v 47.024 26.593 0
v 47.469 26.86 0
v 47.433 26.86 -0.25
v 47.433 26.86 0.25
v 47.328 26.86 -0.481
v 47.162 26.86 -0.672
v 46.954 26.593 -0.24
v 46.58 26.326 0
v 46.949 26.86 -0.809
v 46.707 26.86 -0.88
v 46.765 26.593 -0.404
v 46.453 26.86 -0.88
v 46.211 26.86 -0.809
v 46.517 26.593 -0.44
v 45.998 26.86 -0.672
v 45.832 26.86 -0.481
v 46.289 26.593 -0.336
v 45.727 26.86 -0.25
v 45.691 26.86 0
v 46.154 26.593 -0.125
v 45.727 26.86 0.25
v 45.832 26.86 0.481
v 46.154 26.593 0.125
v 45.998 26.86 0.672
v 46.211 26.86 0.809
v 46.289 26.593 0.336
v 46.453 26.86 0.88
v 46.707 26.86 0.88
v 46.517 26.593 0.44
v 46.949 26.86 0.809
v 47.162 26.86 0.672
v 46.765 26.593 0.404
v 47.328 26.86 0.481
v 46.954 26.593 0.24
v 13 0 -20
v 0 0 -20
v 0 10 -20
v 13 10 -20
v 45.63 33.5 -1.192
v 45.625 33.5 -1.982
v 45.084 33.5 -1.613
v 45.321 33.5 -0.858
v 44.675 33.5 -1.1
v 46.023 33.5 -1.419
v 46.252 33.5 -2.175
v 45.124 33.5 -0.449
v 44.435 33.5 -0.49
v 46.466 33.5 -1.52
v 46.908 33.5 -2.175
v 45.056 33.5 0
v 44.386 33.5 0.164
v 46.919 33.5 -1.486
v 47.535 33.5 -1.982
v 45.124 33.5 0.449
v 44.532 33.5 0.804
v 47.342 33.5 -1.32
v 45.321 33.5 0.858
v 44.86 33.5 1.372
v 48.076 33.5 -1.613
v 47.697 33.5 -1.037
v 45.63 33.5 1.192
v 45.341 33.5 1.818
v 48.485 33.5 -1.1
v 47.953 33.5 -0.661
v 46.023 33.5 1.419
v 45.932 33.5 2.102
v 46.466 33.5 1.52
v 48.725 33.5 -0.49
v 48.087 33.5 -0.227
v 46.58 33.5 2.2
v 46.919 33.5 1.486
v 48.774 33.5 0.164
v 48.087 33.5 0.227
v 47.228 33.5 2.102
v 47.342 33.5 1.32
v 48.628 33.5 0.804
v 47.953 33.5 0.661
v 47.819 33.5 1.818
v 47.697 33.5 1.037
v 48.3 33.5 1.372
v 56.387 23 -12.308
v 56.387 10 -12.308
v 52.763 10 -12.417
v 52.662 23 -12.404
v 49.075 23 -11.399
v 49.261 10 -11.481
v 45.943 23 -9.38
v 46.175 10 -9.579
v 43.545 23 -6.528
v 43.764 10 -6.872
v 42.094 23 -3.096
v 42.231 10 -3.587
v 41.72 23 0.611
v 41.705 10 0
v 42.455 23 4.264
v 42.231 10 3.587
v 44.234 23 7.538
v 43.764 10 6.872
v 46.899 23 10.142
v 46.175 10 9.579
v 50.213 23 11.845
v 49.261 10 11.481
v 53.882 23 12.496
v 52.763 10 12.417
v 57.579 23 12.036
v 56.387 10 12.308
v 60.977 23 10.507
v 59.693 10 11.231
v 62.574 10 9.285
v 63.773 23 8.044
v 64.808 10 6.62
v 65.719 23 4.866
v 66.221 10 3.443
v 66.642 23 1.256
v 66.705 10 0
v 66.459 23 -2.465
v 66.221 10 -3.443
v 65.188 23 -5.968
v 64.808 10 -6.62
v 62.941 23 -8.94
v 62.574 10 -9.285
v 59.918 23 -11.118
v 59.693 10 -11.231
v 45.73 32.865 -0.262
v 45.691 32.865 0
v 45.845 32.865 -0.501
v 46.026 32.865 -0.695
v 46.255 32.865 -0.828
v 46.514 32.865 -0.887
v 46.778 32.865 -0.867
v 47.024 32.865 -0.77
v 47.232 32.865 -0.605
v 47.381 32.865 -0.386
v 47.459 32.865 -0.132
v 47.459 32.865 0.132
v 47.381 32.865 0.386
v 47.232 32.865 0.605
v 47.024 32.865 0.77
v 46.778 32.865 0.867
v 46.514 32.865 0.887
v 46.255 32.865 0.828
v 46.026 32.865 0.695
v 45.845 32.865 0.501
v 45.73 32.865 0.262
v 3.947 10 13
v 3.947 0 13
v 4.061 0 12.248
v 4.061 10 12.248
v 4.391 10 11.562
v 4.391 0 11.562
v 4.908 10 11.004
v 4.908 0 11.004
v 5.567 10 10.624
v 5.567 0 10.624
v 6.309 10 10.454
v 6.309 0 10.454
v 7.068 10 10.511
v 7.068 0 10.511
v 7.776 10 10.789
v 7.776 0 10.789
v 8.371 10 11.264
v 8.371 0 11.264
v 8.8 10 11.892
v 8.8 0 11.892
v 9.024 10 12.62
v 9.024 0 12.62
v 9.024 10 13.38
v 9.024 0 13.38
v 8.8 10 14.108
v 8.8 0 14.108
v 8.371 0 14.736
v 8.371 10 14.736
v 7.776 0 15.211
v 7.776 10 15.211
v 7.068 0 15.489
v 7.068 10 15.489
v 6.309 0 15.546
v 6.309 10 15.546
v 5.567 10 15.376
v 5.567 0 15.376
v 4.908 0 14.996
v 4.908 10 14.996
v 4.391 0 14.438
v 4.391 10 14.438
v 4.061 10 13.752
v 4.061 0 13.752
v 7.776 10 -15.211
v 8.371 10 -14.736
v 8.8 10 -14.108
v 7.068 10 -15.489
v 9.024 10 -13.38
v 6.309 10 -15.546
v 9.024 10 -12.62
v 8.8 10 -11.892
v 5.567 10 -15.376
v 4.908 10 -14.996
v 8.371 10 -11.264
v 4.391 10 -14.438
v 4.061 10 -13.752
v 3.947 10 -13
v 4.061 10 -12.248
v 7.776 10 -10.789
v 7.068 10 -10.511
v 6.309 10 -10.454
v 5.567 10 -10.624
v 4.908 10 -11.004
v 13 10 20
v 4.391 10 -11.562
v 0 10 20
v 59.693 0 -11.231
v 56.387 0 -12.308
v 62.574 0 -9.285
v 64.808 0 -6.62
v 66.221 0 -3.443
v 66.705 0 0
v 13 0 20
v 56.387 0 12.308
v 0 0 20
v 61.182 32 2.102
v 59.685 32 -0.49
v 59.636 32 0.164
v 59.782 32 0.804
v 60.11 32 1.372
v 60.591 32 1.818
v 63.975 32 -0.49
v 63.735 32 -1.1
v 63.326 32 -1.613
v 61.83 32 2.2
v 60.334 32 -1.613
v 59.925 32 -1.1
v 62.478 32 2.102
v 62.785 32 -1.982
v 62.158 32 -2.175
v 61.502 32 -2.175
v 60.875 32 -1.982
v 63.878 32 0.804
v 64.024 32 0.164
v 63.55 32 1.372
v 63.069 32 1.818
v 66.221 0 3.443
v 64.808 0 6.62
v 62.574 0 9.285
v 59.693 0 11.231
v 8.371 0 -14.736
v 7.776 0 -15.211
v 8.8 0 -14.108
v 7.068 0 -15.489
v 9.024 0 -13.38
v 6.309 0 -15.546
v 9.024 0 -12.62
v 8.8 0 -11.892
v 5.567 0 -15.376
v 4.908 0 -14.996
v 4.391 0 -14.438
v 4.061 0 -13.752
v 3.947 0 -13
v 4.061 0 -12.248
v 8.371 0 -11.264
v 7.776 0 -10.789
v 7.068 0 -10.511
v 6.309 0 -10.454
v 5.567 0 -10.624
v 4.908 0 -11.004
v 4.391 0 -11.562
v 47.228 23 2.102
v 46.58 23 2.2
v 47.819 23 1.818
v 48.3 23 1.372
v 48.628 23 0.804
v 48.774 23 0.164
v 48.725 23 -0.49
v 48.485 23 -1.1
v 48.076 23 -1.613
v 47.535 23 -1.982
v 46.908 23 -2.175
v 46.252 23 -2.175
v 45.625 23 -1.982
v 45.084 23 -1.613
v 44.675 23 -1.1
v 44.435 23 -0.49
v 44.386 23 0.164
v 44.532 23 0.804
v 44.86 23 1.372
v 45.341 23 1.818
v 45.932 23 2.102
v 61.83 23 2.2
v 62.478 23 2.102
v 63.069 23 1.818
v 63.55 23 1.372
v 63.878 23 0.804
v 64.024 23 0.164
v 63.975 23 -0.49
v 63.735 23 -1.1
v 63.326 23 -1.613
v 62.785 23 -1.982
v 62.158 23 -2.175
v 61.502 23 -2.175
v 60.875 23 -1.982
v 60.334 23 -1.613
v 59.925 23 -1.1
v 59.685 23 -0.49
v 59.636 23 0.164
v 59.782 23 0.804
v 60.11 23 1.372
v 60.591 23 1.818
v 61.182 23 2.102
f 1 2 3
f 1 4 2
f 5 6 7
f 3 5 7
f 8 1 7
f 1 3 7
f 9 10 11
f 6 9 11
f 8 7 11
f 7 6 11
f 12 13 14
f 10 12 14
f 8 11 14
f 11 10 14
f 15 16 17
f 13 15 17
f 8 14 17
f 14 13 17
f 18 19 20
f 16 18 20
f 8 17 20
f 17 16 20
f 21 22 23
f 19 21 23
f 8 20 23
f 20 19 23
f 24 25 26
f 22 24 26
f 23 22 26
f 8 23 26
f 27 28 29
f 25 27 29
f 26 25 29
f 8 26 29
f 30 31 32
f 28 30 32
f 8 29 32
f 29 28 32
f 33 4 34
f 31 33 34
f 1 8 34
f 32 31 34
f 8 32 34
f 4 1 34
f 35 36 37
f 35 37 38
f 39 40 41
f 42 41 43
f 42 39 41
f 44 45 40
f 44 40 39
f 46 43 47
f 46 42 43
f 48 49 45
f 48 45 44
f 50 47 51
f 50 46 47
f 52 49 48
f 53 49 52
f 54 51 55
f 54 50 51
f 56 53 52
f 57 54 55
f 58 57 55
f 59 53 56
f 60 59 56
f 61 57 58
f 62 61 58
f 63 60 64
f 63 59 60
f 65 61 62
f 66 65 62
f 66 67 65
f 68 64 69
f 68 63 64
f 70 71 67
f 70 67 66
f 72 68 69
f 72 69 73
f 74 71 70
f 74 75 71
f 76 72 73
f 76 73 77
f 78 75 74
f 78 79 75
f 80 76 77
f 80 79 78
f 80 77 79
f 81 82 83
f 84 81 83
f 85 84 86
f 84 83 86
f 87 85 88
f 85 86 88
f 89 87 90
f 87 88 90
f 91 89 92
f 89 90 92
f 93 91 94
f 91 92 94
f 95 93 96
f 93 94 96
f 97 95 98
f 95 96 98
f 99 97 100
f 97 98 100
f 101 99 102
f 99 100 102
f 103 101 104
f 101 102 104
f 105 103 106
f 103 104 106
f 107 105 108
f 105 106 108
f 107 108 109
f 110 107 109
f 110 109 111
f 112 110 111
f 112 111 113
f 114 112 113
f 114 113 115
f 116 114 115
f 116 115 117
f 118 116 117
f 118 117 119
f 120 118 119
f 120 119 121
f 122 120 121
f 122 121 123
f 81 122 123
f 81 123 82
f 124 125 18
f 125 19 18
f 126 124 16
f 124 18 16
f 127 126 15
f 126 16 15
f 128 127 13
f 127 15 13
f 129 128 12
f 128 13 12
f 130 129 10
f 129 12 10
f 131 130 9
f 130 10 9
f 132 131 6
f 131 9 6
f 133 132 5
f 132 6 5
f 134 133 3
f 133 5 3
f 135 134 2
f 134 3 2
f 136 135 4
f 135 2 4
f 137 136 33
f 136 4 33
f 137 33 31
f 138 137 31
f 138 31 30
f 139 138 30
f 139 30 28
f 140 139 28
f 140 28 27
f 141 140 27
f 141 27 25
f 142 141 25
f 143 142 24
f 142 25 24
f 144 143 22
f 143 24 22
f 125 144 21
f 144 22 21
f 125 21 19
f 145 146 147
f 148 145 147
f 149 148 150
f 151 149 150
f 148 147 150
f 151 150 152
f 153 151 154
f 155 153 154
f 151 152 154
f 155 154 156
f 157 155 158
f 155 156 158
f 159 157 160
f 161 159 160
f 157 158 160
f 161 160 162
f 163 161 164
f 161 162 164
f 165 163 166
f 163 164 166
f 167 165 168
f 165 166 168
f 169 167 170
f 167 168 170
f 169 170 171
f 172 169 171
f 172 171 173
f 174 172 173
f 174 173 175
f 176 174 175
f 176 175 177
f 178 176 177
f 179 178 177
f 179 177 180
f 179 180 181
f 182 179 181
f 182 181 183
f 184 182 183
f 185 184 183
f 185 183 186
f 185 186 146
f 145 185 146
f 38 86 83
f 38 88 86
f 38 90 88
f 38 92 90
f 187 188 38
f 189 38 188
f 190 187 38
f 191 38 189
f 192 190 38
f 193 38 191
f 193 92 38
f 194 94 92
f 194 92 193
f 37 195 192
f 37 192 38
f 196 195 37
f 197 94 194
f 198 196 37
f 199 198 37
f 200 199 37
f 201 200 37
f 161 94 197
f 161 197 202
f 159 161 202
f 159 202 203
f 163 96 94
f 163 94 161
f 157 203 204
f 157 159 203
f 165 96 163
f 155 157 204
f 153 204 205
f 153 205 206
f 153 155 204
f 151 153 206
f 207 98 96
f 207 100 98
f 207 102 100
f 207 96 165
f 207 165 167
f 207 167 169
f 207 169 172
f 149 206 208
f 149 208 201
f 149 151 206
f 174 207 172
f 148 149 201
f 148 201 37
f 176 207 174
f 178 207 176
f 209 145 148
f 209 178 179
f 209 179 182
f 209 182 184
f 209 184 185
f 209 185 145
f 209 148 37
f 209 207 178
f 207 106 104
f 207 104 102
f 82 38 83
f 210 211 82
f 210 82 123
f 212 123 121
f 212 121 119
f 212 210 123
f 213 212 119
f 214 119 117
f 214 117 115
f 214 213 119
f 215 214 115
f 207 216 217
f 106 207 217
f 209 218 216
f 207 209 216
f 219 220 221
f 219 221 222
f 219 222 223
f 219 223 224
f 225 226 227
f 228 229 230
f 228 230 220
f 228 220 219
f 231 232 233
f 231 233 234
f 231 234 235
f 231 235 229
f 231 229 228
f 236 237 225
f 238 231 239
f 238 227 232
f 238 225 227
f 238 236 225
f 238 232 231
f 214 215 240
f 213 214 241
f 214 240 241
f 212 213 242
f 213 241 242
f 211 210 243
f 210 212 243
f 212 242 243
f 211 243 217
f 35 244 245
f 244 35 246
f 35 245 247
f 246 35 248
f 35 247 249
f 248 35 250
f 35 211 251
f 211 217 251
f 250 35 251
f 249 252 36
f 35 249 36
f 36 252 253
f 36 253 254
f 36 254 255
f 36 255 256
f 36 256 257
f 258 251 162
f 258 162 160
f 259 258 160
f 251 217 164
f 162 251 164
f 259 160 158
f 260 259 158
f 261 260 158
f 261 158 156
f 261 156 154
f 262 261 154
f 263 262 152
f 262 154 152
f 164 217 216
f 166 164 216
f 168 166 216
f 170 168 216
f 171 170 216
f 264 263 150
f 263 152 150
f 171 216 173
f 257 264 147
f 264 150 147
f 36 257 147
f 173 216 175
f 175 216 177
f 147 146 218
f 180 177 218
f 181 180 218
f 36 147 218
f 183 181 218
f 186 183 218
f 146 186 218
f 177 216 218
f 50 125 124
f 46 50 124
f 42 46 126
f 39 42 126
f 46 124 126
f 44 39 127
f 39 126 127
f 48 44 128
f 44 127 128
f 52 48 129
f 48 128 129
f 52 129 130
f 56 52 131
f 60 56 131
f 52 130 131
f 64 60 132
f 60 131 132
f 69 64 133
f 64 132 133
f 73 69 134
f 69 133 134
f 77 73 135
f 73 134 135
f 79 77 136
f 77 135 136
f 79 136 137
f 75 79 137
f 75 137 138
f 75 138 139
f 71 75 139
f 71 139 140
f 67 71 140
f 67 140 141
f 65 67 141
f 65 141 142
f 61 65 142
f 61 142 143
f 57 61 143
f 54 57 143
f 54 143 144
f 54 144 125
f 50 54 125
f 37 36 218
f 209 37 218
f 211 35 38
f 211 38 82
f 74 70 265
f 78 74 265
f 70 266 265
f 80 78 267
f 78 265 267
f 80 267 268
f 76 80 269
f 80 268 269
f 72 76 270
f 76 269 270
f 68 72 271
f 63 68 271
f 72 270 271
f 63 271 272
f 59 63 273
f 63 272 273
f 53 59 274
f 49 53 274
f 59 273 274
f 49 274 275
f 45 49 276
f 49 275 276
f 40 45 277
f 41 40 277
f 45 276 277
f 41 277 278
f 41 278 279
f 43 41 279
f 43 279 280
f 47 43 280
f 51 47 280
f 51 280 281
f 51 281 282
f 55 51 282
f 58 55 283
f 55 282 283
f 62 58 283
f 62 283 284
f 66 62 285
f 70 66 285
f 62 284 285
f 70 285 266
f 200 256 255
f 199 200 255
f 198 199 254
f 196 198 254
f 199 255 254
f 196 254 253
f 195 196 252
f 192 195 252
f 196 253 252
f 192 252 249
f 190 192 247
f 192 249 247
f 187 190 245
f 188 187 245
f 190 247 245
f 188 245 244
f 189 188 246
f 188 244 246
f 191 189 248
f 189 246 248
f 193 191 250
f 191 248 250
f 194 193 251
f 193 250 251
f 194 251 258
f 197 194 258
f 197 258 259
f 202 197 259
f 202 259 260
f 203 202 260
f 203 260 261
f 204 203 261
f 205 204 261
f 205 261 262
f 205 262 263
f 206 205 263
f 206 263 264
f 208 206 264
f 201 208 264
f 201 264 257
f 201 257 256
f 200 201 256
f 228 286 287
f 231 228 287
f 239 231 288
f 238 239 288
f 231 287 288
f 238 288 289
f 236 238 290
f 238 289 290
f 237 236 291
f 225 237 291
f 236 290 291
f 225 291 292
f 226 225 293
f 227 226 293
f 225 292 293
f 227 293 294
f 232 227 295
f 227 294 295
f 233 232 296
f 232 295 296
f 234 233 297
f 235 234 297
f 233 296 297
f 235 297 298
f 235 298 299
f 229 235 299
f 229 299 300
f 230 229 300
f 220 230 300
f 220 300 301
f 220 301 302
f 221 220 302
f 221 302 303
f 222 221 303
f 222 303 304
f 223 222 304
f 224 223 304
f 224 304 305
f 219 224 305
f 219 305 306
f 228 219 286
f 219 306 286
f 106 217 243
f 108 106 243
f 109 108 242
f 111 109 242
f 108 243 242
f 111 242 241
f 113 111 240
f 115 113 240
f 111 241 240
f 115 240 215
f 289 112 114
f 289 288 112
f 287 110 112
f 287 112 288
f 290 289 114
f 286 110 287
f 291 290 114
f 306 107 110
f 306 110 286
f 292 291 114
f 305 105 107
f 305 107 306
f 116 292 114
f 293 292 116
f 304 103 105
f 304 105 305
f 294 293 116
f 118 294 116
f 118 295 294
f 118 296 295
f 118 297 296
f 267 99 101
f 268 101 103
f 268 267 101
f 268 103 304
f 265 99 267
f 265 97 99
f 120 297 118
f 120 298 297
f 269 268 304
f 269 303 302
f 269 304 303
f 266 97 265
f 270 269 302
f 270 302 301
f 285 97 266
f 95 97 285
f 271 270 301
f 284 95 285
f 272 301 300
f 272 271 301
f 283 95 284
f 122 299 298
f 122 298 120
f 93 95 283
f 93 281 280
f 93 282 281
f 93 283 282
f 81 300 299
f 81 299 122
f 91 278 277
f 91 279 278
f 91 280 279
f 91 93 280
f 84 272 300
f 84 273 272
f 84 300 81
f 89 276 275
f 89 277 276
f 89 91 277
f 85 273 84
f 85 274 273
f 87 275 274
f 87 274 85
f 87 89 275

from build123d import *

# Parameters (mm, degrees)
BOSS_EXTRUDE1_DEPTH             = 10
SKETCH2_R                       = 12.5
BOSS_EXTRUDE2_DEPTH             = 13
F_10_CLEARANCE_HOLE1_D          = 5.1054
F_10_CLEARANCE_HOLE1_DEPTH      = 135.89
F_10_CLEARANCE_HOLE1_TIP        = 1.533816902
SKETCH6_R                       = 2.2
BOSS_EXTRUDE3_DEPTH             = 9
SKETCH7_R                       = 2.2
BOSS_EXTRUDE4_DEPTH             = 1.5
F_2_56_TAPPED_HOLE1_D           = 1.778
F_2_56_TAPPED_HOLE1_DEPTH       = 6.64
F_2_56_TAPPED_HOLE1_CSINK_D     = 3.048
F_2_56_TAPPED_HOLE1_CSINK_ANGLE = 90
F_2_56_TAPPED_HOLE1_TIP         = 0.53416509


with BuildPart() as part:
    # Sketch1 → Boss-Extrude1 (new body)
    with BuildSketch(Plane(origin=(0, 0, 0), x_dir=(1, 0, 0), z_dir=(0, 1, 0))):
        with BuildLine():
            Line((0, 0), (0, 20))
            Line((0, 20), (13, 20))
            Line((13, 20), (56.387051948, 12.308072526))
            ThreePointArc((56.387051948, 12.308072526), (63.784291449, 8.030390733), (66.705, 0))
            Line((66.705, 0), (0, 0))
        make_face()
    extrude(amount=BOSS_EXTRUDE1_DEPTH)

    # Mirror1: part across plane


with BuildPart() as part_1:
    add(part.part)
    add(part.part.mirror(Plane(origin=(66.705, 10, 0), x_dir=(1, 0, 0), z_dir=(0, 0, -1))))

    # Sketch2 → Boss-Extrude2 (add)
    with BuildSketch(Plane(origin=(0, 10, 0), x_dir=(1, 0, 0), z_dir=(0, 1, 0))):
        with Locations(Location((54.205, 0, 0), (0, 0, 79.946704324))):  # turned: the seam where the file's is
            Circle(SKETCH2_R)
    extrude(amount=BOSS_EXTRUDE2_DEPTH)

    # #10 Clearance Hole1
    with Locations(Plane(origin=(0, 10, 0), x_dir=(1, 0, 0), z_dir=(0, 1, 0))):
        with Locations((6.5, 13), (6.5, -13)):
            Hole(F_10_CLEARANCE_HOLE1_D / 2, depth=F_10_CLEARANCE_HOLE1_DEPTH)
            with Locations((0, 0, -(F_10_CLEARANCE_HOLE1_DEPTH + F_10_CLEARANCE_HOLE1_TIP / 2))):  # 118° drill point
                Cone(0, F_10_CLEARANCE_HOLE1_D / 2, F_10_CLEARANCE_HOLE1_TIP, mode=Mode.SUBTRACT)

    # Sketch6 → Boss-Extrude3 (add)
    with BuildSketch(Plane(origin=(0, 23, 0), x_dir=(1, 0, 0), z_dir=(0, 1, 0))):
        with Locations(Location((61.83, 0, 0), (0, 0, 270))):  # turned: the seam where the file's is
            Circle(SKETCH6_R)
        with Locations(Location((46.58, 0, 0), (0, 0, 270))):  # turned: the seam where the file's is
            Circle(SKETCH6_R)
    extrude(amount=BOSS_EXTRUDE3_DEPTH)

    # Sketch7 → Boss-Extrude4 (add)
    with BuildSketch(Plane(origin=(0, 32, 0), x_dir=(1, 0, 0), z_dir=(0, 1, 0))):
        with Locations(Location((46.58, 0, 0), (0, 0, 270))):  # turned: the seam where the file's is
            Circle(SKETCH7_R)
    extrude(amount=BOSS_EXTRUDE4_DEPTH)

    # #2-56 Tapped Hole1
    with Locations(Plane(origin=(0, 33.5, 0), x_dir=(1, 0, 0), z_dir=(0, 1, 0))):
        with Locations((46.58, 0)):
            CounterSinkHole(F_2_56_TAPPED_HOLE1_D / 2, F_2_56_TAPPED_HOLE1_CSINK_D / 2, depth=F_2_56_TAPPED_HOLE1_DEPTH, counter_sink_angle=F_2_56_TAPPED_HOLE1_CSINK_ANGLE)
            with Locations((0, 0, -(F_2_56_TAPPED_HOLE1_DEPTH + F_2_56_TAPPED_HOLE1_TIP / 2))):  # 118° drill point
                Cone(0, F_2_56_TAPPED_HOLE1_D / 2, F_2_56_TAPPED_HOLE1_TIP, mode=Mode.SUBTRACT)


solid = part_1.part
